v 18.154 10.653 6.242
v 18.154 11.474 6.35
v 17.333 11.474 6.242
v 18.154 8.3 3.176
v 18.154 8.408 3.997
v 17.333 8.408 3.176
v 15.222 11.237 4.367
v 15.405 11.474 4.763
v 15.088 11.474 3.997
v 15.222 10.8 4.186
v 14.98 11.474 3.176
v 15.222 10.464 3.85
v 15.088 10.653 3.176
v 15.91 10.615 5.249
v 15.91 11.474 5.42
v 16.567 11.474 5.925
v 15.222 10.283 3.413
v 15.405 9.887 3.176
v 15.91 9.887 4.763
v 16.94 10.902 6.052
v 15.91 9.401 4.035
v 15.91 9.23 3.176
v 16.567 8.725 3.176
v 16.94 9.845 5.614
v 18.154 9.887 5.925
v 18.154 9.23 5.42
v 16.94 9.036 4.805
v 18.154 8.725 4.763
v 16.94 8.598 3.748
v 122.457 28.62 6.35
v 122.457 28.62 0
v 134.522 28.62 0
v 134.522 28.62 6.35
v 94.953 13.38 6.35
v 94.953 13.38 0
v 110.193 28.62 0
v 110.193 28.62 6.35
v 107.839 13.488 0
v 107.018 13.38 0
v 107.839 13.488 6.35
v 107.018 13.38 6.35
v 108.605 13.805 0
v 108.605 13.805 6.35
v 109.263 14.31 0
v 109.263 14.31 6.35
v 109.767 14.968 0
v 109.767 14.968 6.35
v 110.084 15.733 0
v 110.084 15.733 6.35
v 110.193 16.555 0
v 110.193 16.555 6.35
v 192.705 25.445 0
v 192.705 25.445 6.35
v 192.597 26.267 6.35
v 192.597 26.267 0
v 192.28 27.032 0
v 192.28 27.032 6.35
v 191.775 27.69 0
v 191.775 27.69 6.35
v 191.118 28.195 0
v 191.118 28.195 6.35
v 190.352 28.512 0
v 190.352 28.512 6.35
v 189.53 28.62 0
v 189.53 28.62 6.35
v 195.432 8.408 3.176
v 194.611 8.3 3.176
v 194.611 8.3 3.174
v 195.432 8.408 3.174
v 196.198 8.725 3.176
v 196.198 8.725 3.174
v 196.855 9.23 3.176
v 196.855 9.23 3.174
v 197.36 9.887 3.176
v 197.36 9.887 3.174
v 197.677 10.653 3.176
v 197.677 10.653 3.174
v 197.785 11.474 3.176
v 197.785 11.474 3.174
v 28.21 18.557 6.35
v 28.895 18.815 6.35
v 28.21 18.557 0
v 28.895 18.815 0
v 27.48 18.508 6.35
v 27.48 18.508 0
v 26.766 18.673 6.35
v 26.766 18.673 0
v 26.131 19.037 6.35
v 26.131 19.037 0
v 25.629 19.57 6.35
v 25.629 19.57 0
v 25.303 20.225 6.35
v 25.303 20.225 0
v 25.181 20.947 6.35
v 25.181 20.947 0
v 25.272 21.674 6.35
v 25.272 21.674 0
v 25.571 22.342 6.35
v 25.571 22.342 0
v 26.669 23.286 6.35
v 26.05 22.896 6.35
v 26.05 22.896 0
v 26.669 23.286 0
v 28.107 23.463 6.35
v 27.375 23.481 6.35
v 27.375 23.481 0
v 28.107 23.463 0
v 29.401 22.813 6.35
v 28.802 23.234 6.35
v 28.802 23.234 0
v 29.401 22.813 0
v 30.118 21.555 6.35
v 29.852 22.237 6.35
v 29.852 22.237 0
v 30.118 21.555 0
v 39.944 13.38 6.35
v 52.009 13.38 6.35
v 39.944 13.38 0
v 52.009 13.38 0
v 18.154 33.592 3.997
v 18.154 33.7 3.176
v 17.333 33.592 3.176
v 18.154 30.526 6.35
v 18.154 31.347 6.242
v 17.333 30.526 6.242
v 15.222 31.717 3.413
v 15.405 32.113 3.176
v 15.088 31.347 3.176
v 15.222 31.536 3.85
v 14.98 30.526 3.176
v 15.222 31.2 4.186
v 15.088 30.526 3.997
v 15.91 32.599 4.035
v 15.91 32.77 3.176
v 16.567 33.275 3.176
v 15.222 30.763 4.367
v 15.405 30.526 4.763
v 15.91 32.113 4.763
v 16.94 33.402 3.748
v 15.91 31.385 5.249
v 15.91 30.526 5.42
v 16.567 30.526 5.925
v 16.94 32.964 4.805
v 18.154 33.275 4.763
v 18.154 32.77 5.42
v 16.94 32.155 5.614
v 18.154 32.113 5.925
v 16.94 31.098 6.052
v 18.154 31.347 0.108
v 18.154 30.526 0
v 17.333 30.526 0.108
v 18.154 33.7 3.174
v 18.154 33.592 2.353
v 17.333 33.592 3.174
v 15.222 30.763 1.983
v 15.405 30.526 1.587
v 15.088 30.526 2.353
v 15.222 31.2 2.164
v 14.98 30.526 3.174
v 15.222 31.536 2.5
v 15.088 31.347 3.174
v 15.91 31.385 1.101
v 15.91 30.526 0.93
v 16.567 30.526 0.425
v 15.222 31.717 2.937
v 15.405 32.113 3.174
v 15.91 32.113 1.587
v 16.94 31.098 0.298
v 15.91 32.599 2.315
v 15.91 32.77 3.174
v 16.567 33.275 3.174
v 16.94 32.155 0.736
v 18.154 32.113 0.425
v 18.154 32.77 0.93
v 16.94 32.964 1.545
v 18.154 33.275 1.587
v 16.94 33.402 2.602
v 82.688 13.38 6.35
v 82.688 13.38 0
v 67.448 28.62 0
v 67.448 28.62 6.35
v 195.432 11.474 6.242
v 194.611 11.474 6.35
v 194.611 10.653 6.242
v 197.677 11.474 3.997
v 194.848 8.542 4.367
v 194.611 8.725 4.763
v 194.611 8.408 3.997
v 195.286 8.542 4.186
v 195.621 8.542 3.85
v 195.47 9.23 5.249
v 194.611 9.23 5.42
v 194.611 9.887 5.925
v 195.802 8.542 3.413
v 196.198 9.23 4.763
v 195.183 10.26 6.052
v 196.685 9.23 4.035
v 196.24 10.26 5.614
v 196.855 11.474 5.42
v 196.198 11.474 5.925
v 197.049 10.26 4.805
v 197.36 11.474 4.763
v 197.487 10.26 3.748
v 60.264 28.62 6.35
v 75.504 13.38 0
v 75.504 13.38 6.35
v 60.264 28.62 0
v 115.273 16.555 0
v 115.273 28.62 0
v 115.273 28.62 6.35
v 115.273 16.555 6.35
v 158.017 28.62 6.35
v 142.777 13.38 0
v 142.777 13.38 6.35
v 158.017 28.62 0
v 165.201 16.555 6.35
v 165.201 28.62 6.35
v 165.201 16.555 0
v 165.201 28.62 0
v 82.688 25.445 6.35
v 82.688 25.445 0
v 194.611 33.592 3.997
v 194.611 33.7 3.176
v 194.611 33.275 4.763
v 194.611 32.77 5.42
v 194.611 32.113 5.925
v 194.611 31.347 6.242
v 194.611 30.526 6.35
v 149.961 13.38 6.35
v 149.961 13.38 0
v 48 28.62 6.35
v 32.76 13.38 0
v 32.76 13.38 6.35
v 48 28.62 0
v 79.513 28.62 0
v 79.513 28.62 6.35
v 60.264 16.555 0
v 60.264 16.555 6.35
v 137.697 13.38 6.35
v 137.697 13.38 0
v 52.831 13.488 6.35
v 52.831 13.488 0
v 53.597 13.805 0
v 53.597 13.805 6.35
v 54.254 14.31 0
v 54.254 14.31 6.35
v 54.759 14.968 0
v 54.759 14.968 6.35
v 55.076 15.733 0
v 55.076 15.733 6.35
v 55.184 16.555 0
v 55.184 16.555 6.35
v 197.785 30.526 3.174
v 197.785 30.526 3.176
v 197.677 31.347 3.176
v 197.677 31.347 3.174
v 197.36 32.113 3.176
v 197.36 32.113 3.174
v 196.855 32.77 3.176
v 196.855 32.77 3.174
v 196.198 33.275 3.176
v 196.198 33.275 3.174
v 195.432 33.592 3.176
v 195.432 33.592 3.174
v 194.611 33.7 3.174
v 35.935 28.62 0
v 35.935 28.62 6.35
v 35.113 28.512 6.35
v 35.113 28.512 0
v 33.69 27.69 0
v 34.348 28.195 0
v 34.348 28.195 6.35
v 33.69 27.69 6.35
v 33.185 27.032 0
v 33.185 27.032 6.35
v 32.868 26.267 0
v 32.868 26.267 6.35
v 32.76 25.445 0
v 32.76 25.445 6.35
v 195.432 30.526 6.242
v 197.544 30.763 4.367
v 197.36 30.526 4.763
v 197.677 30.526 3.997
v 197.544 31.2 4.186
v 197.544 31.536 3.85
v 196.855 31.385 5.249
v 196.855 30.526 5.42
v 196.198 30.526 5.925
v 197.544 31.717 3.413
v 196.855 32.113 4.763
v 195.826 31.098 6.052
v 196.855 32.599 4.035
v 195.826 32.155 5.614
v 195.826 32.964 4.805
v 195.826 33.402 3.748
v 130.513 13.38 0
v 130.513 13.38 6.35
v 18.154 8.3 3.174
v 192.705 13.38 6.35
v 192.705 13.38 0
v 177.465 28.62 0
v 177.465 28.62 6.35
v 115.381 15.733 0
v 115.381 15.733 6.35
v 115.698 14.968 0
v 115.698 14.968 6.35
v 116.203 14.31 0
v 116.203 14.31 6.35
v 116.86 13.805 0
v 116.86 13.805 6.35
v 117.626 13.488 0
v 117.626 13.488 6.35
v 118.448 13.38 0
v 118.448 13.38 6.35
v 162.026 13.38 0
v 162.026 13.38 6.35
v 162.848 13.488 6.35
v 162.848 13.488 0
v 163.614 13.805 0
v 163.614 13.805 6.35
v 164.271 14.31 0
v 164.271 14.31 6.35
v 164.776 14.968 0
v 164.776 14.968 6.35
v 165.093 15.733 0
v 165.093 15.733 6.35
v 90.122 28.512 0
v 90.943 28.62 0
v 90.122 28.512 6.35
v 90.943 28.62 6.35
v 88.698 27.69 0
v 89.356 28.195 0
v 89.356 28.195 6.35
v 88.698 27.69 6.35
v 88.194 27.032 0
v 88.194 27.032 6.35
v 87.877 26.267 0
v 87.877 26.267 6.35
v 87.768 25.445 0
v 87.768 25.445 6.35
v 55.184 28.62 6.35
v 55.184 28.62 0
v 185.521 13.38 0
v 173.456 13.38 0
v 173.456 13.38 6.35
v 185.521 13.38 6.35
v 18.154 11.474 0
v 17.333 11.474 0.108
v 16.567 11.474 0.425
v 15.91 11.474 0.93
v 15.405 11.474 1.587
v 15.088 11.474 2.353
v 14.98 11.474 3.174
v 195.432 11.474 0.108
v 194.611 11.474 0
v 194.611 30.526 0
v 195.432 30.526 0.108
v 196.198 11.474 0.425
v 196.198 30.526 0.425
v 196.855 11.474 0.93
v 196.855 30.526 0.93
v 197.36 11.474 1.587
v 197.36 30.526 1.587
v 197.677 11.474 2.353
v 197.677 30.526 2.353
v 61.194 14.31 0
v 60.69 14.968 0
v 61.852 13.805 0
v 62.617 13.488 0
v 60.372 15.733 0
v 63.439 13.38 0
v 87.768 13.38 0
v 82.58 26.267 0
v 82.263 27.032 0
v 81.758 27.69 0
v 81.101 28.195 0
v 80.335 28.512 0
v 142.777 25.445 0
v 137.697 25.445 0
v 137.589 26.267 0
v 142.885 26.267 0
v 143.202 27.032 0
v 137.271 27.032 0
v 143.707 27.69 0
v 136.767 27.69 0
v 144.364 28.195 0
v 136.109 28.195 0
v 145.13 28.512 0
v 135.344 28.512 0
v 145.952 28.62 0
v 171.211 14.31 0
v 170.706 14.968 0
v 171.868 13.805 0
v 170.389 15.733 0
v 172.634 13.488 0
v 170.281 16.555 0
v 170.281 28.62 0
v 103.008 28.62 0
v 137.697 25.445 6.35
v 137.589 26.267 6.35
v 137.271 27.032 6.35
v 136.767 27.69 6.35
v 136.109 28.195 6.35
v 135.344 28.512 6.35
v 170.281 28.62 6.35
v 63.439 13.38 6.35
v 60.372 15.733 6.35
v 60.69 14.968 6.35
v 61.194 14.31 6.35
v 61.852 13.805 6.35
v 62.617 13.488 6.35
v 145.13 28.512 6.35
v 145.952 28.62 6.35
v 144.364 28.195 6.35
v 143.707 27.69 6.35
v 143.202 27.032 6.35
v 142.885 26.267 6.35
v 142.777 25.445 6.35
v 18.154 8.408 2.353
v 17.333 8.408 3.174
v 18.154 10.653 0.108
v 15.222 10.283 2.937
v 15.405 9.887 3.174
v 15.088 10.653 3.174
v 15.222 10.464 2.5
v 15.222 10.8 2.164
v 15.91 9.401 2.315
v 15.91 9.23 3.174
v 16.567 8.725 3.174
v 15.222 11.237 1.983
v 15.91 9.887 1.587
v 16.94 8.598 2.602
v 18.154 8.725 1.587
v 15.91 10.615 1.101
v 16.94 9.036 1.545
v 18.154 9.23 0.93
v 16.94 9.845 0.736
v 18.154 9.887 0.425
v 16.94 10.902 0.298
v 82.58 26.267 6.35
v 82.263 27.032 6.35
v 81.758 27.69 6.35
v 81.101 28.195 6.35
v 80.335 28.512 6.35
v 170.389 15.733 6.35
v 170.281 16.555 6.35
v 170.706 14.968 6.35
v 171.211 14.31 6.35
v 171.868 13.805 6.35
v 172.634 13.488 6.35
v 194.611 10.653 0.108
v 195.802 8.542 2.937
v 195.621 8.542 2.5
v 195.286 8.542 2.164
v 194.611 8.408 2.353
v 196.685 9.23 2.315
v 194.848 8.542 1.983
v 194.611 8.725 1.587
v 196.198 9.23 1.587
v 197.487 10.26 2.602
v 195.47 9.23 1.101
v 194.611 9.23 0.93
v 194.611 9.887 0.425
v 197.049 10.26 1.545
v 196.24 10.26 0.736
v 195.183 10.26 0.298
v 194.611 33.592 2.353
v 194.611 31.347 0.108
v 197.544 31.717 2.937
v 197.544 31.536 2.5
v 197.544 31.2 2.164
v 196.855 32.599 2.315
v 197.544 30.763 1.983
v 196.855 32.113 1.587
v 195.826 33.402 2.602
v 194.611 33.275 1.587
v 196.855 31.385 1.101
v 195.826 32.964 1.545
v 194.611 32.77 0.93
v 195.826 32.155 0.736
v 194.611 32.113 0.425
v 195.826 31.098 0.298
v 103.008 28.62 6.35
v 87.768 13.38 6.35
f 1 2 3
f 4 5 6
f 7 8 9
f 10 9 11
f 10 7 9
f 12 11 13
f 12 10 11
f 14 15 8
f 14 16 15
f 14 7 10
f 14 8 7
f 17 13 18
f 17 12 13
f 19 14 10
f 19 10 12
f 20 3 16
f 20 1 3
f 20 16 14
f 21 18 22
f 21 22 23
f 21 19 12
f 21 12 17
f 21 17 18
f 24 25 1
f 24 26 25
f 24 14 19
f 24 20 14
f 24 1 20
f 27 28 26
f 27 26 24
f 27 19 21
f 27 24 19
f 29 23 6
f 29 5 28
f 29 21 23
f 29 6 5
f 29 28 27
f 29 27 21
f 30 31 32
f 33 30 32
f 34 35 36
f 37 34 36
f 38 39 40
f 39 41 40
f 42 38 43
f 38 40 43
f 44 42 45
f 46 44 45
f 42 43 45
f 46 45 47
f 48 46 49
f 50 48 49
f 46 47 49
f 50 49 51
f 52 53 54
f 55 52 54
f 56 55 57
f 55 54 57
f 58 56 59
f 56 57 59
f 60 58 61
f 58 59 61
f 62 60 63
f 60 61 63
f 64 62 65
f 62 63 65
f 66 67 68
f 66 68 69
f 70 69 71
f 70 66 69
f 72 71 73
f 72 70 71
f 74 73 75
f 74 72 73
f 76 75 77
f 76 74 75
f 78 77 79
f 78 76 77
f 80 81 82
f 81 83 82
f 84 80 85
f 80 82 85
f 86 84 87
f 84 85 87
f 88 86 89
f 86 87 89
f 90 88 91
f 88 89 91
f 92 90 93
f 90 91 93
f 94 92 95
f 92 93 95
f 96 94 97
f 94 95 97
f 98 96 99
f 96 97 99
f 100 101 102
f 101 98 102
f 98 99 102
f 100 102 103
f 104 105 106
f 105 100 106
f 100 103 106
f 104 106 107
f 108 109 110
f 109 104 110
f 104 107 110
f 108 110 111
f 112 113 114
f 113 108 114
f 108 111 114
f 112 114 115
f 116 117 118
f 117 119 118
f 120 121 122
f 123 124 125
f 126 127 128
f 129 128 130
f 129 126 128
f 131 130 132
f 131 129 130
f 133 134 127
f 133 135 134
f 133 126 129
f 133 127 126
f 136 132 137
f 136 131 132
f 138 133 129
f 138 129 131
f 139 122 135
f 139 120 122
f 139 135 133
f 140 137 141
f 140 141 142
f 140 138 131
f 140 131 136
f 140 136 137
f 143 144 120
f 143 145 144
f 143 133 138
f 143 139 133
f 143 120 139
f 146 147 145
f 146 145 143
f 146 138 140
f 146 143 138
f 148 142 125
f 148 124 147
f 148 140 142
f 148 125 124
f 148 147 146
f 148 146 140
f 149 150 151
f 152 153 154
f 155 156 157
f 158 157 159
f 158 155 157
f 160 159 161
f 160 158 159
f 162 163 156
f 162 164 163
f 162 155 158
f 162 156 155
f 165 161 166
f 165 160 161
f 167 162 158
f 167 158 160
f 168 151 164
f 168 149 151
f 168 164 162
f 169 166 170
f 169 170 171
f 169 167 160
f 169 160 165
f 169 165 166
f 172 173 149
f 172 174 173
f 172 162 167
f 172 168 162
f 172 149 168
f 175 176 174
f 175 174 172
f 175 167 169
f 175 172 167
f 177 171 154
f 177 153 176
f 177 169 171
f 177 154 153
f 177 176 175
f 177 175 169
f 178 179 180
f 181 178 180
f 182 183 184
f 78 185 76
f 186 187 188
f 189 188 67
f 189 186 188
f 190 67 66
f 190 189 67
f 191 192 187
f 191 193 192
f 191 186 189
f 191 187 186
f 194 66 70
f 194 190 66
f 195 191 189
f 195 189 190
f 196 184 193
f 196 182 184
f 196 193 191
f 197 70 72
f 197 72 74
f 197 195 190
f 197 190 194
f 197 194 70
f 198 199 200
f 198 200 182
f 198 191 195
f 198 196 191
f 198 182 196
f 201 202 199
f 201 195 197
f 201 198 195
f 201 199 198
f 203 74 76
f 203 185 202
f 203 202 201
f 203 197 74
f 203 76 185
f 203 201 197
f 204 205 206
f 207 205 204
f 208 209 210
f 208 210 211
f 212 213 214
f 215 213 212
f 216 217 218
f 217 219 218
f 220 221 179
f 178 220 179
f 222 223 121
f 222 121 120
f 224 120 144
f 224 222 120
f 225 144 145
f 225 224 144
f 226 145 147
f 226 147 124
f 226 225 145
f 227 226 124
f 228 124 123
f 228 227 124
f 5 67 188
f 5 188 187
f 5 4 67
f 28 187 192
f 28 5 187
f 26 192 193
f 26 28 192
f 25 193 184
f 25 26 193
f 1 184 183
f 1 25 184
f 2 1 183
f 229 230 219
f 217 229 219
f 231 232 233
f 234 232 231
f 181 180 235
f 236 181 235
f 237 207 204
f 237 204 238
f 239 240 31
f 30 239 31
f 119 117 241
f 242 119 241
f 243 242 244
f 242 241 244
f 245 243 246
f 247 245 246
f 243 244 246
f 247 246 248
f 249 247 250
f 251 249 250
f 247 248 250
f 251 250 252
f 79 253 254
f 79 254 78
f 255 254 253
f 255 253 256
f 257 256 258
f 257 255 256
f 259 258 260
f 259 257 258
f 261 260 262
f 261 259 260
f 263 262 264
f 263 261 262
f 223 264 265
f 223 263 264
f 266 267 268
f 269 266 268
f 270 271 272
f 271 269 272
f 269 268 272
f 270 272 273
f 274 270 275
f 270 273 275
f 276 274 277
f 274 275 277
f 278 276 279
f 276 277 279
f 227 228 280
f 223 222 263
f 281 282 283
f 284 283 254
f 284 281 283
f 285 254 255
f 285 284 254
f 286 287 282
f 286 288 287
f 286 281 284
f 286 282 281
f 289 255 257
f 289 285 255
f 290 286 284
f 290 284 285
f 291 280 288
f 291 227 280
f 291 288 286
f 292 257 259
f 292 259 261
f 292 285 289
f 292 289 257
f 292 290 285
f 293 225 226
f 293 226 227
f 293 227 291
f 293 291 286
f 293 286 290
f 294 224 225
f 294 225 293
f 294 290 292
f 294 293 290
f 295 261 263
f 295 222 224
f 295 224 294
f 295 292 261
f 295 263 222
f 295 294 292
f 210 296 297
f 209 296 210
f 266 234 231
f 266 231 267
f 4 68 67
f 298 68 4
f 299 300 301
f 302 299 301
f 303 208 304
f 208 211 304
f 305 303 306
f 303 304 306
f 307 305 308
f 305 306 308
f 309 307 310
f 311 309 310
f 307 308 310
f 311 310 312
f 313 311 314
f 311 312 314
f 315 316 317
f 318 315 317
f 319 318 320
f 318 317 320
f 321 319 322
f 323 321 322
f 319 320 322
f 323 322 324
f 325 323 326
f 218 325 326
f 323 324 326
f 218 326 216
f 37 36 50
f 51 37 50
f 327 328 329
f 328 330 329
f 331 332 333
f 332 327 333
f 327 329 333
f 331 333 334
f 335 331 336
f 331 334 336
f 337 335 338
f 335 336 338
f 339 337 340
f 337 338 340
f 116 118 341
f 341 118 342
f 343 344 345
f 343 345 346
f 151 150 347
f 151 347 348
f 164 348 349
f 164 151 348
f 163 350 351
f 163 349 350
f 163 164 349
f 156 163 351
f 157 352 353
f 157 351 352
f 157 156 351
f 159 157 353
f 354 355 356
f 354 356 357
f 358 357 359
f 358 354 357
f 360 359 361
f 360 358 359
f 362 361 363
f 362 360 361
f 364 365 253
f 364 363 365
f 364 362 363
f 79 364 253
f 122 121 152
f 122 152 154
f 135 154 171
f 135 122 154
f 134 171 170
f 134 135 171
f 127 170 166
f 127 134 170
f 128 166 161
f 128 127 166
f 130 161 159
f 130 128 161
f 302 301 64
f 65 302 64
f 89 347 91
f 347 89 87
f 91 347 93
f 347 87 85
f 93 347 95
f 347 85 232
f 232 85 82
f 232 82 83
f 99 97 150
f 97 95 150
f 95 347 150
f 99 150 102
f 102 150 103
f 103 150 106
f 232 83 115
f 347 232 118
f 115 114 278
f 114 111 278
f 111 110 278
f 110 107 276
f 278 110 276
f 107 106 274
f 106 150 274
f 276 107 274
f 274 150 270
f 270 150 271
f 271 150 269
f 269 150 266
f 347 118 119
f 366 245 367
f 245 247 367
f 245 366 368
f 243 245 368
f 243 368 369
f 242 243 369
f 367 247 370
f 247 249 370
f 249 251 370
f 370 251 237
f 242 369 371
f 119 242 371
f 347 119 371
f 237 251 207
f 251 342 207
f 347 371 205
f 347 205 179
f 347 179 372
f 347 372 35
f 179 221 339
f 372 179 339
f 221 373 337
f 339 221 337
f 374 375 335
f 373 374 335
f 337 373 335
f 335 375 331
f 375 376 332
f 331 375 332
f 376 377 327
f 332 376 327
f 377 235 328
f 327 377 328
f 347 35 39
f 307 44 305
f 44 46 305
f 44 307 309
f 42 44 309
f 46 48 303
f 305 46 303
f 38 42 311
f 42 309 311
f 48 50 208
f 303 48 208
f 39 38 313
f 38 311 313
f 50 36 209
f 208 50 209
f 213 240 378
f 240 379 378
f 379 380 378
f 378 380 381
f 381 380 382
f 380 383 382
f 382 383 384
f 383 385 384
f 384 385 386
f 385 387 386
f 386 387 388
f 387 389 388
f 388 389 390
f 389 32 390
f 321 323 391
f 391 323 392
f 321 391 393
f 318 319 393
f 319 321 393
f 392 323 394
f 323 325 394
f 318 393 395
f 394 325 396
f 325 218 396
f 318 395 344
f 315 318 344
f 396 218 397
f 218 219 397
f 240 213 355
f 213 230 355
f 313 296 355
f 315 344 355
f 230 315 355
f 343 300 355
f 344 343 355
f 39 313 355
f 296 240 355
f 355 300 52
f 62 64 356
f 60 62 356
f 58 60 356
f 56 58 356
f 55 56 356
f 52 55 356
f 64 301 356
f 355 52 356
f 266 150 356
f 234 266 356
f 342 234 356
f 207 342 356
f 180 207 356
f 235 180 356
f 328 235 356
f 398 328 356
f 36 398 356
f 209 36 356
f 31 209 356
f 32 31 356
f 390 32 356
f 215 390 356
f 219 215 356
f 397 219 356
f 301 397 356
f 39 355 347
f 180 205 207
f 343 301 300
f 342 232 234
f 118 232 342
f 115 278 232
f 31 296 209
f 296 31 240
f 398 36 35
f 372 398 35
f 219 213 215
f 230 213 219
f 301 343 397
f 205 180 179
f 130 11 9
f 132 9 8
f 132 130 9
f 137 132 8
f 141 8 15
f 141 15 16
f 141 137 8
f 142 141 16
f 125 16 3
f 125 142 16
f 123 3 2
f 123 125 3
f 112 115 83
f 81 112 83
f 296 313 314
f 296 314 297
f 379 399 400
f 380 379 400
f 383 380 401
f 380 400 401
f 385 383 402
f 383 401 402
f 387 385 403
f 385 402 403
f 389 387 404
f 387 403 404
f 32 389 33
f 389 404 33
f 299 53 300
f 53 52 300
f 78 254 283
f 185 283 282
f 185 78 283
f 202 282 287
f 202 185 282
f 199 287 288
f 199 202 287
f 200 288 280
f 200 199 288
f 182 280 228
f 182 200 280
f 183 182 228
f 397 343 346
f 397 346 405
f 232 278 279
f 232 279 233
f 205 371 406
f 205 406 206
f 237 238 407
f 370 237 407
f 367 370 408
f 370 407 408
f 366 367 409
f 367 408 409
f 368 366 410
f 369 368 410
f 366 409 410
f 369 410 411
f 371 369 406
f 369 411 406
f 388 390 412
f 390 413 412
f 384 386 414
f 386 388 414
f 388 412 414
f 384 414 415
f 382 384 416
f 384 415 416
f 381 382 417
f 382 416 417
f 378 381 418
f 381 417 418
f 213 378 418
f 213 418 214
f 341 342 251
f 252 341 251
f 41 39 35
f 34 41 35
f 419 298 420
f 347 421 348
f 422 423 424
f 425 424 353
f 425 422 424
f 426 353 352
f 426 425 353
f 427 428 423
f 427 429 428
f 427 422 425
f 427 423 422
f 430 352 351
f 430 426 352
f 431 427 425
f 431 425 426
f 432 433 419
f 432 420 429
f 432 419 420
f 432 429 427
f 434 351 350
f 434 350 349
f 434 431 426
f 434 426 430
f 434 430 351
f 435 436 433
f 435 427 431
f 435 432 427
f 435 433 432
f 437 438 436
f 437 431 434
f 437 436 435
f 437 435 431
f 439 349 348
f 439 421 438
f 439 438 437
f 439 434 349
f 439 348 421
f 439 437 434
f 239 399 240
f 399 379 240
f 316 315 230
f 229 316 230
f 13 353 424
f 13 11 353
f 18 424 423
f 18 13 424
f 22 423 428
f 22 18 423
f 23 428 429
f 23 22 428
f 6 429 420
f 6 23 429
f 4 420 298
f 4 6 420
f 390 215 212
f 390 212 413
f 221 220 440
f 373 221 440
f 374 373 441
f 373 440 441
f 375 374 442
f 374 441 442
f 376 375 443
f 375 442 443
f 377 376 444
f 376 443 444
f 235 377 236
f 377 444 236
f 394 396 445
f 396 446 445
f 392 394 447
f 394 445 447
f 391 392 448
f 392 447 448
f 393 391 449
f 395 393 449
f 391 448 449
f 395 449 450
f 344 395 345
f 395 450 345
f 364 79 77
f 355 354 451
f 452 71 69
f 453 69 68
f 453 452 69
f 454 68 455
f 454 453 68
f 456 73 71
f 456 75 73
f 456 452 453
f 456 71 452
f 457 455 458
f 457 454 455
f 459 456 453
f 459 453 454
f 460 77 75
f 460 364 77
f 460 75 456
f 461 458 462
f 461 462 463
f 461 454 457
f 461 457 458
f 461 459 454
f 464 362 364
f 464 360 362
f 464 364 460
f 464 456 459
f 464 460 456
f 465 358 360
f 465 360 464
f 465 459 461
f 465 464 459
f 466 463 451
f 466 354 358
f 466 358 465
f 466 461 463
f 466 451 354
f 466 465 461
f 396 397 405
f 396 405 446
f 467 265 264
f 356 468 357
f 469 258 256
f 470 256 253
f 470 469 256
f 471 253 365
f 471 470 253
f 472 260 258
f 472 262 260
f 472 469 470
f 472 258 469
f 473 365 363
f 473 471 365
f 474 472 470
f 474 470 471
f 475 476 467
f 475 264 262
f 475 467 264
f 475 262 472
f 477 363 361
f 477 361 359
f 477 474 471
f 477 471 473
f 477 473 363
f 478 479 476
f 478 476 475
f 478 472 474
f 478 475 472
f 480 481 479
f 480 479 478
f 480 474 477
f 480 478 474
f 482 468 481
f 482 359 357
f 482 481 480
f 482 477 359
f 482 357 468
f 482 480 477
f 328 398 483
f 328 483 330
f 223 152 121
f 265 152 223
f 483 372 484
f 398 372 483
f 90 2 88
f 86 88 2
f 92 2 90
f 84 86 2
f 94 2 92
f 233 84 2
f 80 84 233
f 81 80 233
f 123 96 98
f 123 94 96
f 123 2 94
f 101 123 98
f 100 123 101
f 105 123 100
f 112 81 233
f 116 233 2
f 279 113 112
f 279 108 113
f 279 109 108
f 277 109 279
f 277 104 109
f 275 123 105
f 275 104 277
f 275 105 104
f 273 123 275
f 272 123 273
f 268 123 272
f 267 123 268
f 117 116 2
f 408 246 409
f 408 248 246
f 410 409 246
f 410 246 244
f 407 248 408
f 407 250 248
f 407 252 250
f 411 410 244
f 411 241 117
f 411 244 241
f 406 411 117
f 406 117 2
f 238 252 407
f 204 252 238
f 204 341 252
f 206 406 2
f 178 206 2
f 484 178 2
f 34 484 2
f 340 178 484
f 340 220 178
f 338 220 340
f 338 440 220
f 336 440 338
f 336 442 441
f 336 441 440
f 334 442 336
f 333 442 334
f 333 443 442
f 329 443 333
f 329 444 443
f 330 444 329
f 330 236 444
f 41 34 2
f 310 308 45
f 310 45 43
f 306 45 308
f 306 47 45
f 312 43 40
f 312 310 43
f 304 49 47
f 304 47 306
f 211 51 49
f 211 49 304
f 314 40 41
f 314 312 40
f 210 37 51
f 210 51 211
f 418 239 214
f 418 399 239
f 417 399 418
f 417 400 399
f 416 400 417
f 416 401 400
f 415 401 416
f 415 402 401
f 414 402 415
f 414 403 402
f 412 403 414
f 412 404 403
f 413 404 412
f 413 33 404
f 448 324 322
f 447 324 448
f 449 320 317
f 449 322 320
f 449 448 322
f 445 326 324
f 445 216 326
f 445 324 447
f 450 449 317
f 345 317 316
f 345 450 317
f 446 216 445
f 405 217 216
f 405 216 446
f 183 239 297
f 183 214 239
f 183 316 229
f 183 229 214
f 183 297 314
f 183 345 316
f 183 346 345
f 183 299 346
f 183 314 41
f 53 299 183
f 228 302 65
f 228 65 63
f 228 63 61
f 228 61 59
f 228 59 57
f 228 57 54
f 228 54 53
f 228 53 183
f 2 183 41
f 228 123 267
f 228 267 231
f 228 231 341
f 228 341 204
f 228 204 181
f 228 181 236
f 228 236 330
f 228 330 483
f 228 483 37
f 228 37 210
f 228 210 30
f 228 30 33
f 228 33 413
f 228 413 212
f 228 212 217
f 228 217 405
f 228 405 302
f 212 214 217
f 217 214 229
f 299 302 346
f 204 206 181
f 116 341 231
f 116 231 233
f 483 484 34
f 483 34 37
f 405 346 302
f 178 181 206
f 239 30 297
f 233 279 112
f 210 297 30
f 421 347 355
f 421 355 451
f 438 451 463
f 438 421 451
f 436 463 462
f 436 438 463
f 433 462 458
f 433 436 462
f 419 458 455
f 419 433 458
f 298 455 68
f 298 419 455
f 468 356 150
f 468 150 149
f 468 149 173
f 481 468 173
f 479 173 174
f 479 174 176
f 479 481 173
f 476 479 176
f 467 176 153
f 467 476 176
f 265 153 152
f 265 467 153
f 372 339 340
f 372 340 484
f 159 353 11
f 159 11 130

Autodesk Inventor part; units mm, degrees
ref_plane "YZ Plane" through (0, 0, 0) normal (1, 0, 0) x (0, 1, 0)
ref_plane "XZ Plane" through (0, 0, 0) normal (0, 1, 0) x (-1, 0, 0)
ref_plane "XY Plane" through (0, 0, 0) normal (0, 0, 1) x (1, 0, 0)
sketch "Sketch1" plane through (0, 0, 0) normal (0, 0, 1) x (1, 0, 0)
  line L0 (14.98, 33.7) -> (197.7852, 33.7)
  line L1 (197.7852, 8.3) -> (14.98, 8.3)
  line L2 (14.98, 8.3) -> (14.98, 33.7)
  arc A0 (30.1177, 21.5547) -> (28.8951, 18.8151) centre (27.68, 21) ccw projected
  line L3 (30.1177, 21.5547) -> (28.8951, 18.8151)
  line L4 (-3.175, 42) -> (-122.9515, 42) projected
  line L5 (137.6968, 28.62) -> (137.6968, 13.38)
  line L6 (137.6968, 13.38) -> (122.4568, 28.62)
  line L7 (122.4568, 28.62) -> (137.6968, 28.62)
  line L8 (130.5126, 13.38) -> (115.2726, 28.62)
  line L9 (115.2726, 28.62) -> (115.2726, 13.38)
  line L10 (115.2726, 13.38) -> (130.5126, 13.38)
  line L11 (112.7326, 10.7487) -> (112.7326, 41.4812) construction
  line L12 (87.7684, 28.62) -> (87.7684, 13.38)
  line L13 (87.7684, 13.38) -> (103.0084, 28.62)
  line L14 (103.0084, 28.62) -> (87.7684, 28.62)
  line L15 (94.9526, 13.38) -> (110.1926, 28.62)
  line L16 (110.1926, 28.62) -> (110.1926, 13.38)
  line L17 (110.1926, 13.38) -> (94.9526, 13.38)
  line L18 (85.2284, 8.9371) -> (85.2284, 32.7241) construction
  line L19 (32.76, 28.62) -> (32.76, 13.38)
  line L20 (32.76, 13.38) -> (48, 28.62)
  line L21 (48, 28.62) -> (32.76, 28.62)
  line L22 (39.9442, 13.38) -> (55.1842, 28.62)
  line L23 (55.1842, 28.62) -> (55.1842, 13.38)
  line L24 (55.1842, 13.38) -> (39.9442, 13.38)
  line L25 (82.6884, 28.62) -> (82.6884, 13.38)
  line L26 (82.6884, 13.38) -> (67.4484, 28.62)
  line L27 (67.4484, 28.62) -> (82.6884, 28.62)
  line L28 (75.5042, 13.38) -> (60.2642, 28.62)
  line L29 (60.2642, 13.38) -> (75.5042, 13.38)
  line L30 (60.2642, 28.62) -> (60.2642, 13.38)
  line L31 (140.2368, 33.7) -> (140.2368, 8.3) construction
  line L32 (142.7768, 28.62) -> (142.7768, 13.38)
  line L33 (142.7768, 13.38) -> (158.0168, 28.62)
  line L34 (158.0168, 28.62) -> (142.7768, 28.62)
  line L35 (149.961, 13.38) -> (165.201, 28.62)
  line L36 (165.201, 28.62) -> (165.201, 13.38)
  line L37 (165.201, 13.38) -> (149.961, 13.38)
  line L38 (192.7052, 28.62) -> (192.7052, 13.38)
  line L39 (192.7052, 13.38) -> (177.4652, 28.62)
  line L40 (177.4652, 28.62) -> (192.7052, 28.62)
  line L41 (185.521, 13.38) -> (170.281, 28.62)
  line L42 (170.281, 13.38) -> (185.521, 13.38)
  line L43 (170.281, 28.62) -> (170.281, 13.38)
  line L44 (197.7852, 33.7) -> (197.7852, 8.3)
  point P0 (0, 0)
  dimension "d0" = 12.7
  dimension "d1" = 12.7
  dimension "d2" = 12.7
  dimension "d7" = 45
  dimension "d9" = 5.08
  dimension "d10" = 5.08
  dimension "d11" = 5.08
  dimension "d12" = 0
  dimension "d14" = 2.54
  dimension "d15" = 2.54
  dimension "d16" = 5.08
  dimension "d23" = 2.54
  dimension "d24" = 5.08
extrude "Extrusion3" add sketch "Sketch1" along normal blind 6.35
fillet "Fillet5" radius 3.175 12 edges at (165.201, 13.38, 3.175) (170.281, 13.38, 3.175) (192.7052, 28.62, 3.175) (142.7768, 28.62, 3.175) (137.6968, 28.62, 3.175) (115.2726, 13.38, 3.175) (110.1926, 13.38, 3.175) (87.7684, 28.62, 3.175) (82.6884, 28.62, 3.175) (60.2642, 13.38, 3.175) (55.1842, 13.38, 3.175) (32.76, 28.62, 3.175)
fillet "Fillet6" radius 3.175 12 edges at (106.3826, 33.7, 6.35) (106.3826, 33.7, 0) (197.7852, 33.7, 3.175) (197.7852, 21, 6.35) (197.7852, 21, 0) (197.7852, 8.3, 3.175) (106.3826, 8.3, 6.35) (106.3826, 8.3, 0) (14.98, 21, 0) (14.98, 33.7, 3.175) (14.98, 21, 6.35) (14.98, 8.3, 3.175)
equation "\"d1\" = d0"
equation "\"d24\" = d9"
properties part number "endarm"
